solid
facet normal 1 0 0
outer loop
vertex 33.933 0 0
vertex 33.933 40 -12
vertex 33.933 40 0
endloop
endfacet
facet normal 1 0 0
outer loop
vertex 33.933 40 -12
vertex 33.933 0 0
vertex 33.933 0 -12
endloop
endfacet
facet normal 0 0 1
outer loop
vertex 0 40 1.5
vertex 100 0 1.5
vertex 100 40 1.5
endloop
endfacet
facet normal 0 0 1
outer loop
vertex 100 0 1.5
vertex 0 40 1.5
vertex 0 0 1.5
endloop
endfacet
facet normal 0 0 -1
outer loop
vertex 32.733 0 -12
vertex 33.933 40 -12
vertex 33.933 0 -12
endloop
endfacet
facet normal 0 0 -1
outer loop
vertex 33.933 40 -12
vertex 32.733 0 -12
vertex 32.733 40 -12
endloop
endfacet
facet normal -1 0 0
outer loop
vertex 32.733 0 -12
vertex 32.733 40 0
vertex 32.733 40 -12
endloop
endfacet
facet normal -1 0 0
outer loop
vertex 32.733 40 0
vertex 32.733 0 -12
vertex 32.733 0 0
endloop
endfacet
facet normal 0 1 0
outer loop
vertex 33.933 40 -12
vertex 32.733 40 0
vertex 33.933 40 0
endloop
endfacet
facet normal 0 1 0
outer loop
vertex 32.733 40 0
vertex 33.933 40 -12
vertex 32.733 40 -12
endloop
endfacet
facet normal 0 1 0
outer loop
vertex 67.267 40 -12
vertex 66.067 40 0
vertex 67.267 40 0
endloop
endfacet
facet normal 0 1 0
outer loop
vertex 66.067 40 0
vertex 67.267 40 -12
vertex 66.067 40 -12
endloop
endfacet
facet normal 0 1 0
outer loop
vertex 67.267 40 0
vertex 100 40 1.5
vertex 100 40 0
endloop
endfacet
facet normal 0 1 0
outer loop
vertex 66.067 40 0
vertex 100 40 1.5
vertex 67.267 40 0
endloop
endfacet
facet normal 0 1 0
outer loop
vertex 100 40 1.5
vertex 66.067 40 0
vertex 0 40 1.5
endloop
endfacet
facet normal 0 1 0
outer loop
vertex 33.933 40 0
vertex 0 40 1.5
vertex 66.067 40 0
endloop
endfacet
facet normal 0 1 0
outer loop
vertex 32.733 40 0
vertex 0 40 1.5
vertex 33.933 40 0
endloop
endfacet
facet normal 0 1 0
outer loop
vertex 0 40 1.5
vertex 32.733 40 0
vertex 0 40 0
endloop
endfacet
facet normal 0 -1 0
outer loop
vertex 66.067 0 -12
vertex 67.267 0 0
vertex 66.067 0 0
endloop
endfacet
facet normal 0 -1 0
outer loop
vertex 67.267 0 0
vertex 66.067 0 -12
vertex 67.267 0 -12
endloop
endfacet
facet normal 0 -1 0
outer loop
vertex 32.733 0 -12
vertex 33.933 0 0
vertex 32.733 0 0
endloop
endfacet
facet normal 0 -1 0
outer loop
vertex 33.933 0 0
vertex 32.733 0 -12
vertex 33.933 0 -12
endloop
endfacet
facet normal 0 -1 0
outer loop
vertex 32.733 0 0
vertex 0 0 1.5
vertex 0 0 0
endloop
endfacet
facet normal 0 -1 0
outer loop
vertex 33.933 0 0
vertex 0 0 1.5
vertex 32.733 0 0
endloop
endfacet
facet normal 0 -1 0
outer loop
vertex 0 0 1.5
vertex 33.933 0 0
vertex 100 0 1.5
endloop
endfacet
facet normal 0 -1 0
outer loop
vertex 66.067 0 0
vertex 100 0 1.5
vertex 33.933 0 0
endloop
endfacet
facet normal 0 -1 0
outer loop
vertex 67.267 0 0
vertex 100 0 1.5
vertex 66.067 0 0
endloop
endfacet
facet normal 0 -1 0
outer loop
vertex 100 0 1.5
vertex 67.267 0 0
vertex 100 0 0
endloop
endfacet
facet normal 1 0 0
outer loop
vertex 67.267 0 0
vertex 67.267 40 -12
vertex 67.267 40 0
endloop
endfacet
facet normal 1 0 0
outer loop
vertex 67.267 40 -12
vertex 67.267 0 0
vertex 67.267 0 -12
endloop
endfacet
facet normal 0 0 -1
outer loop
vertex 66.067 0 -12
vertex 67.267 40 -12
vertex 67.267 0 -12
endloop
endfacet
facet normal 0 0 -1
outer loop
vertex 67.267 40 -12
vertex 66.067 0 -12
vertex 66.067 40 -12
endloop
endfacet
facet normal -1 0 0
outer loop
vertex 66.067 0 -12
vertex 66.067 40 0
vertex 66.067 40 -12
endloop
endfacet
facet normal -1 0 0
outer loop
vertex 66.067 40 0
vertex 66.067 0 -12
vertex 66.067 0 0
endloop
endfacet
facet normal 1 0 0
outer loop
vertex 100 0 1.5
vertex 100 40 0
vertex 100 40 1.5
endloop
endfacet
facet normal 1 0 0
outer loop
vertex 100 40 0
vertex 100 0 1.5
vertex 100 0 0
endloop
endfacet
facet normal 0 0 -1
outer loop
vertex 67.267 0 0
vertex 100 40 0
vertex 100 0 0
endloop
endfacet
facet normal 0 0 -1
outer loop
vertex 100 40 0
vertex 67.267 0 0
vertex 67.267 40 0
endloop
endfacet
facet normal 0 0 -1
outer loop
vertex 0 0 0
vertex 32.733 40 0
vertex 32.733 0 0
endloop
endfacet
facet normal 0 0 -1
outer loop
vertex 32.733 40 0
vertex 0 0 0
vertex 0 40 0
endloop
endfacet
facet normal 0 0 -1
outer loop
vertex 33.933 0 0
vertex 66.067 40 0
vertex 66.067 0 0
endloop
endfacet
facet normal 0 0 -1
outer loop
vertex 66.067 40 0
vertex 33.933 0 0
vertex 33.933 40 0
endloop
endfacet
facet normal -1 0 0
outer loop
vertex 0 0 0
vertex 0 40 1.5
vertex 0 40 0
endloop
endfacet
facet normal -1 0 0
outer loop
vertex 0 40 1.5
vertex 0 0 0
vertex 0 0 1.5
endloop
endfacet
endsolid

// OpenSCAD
$fn = 32;

// ----------------------------------------------------------------------
// Ribbed panel: 1.5 mm panel
// ----------------------------------------------------------------------

// --- parameters (mm) ---
panel_l = 100;            // panel length, X
panel_w = 40;             // panel width, Y
panel_t = 1.5;            // panel thickness, Z
rib_t = 1.2;              // rib thickness
rib_h = 12;               // rib height below the panel
ribs = 2;                 // number of ribs

total_h = panel_t + rib_h;  // overall height

union() {
  cube([panel_l, panel_w, panel_t]);
  for (i = [1 : ribs])
    translate([i * panel_l / (ribs + 1) - rib_t / 2, 0, -rib_h])
      cube([rib_t, panel_w, rib_h + panel_t]);
}
